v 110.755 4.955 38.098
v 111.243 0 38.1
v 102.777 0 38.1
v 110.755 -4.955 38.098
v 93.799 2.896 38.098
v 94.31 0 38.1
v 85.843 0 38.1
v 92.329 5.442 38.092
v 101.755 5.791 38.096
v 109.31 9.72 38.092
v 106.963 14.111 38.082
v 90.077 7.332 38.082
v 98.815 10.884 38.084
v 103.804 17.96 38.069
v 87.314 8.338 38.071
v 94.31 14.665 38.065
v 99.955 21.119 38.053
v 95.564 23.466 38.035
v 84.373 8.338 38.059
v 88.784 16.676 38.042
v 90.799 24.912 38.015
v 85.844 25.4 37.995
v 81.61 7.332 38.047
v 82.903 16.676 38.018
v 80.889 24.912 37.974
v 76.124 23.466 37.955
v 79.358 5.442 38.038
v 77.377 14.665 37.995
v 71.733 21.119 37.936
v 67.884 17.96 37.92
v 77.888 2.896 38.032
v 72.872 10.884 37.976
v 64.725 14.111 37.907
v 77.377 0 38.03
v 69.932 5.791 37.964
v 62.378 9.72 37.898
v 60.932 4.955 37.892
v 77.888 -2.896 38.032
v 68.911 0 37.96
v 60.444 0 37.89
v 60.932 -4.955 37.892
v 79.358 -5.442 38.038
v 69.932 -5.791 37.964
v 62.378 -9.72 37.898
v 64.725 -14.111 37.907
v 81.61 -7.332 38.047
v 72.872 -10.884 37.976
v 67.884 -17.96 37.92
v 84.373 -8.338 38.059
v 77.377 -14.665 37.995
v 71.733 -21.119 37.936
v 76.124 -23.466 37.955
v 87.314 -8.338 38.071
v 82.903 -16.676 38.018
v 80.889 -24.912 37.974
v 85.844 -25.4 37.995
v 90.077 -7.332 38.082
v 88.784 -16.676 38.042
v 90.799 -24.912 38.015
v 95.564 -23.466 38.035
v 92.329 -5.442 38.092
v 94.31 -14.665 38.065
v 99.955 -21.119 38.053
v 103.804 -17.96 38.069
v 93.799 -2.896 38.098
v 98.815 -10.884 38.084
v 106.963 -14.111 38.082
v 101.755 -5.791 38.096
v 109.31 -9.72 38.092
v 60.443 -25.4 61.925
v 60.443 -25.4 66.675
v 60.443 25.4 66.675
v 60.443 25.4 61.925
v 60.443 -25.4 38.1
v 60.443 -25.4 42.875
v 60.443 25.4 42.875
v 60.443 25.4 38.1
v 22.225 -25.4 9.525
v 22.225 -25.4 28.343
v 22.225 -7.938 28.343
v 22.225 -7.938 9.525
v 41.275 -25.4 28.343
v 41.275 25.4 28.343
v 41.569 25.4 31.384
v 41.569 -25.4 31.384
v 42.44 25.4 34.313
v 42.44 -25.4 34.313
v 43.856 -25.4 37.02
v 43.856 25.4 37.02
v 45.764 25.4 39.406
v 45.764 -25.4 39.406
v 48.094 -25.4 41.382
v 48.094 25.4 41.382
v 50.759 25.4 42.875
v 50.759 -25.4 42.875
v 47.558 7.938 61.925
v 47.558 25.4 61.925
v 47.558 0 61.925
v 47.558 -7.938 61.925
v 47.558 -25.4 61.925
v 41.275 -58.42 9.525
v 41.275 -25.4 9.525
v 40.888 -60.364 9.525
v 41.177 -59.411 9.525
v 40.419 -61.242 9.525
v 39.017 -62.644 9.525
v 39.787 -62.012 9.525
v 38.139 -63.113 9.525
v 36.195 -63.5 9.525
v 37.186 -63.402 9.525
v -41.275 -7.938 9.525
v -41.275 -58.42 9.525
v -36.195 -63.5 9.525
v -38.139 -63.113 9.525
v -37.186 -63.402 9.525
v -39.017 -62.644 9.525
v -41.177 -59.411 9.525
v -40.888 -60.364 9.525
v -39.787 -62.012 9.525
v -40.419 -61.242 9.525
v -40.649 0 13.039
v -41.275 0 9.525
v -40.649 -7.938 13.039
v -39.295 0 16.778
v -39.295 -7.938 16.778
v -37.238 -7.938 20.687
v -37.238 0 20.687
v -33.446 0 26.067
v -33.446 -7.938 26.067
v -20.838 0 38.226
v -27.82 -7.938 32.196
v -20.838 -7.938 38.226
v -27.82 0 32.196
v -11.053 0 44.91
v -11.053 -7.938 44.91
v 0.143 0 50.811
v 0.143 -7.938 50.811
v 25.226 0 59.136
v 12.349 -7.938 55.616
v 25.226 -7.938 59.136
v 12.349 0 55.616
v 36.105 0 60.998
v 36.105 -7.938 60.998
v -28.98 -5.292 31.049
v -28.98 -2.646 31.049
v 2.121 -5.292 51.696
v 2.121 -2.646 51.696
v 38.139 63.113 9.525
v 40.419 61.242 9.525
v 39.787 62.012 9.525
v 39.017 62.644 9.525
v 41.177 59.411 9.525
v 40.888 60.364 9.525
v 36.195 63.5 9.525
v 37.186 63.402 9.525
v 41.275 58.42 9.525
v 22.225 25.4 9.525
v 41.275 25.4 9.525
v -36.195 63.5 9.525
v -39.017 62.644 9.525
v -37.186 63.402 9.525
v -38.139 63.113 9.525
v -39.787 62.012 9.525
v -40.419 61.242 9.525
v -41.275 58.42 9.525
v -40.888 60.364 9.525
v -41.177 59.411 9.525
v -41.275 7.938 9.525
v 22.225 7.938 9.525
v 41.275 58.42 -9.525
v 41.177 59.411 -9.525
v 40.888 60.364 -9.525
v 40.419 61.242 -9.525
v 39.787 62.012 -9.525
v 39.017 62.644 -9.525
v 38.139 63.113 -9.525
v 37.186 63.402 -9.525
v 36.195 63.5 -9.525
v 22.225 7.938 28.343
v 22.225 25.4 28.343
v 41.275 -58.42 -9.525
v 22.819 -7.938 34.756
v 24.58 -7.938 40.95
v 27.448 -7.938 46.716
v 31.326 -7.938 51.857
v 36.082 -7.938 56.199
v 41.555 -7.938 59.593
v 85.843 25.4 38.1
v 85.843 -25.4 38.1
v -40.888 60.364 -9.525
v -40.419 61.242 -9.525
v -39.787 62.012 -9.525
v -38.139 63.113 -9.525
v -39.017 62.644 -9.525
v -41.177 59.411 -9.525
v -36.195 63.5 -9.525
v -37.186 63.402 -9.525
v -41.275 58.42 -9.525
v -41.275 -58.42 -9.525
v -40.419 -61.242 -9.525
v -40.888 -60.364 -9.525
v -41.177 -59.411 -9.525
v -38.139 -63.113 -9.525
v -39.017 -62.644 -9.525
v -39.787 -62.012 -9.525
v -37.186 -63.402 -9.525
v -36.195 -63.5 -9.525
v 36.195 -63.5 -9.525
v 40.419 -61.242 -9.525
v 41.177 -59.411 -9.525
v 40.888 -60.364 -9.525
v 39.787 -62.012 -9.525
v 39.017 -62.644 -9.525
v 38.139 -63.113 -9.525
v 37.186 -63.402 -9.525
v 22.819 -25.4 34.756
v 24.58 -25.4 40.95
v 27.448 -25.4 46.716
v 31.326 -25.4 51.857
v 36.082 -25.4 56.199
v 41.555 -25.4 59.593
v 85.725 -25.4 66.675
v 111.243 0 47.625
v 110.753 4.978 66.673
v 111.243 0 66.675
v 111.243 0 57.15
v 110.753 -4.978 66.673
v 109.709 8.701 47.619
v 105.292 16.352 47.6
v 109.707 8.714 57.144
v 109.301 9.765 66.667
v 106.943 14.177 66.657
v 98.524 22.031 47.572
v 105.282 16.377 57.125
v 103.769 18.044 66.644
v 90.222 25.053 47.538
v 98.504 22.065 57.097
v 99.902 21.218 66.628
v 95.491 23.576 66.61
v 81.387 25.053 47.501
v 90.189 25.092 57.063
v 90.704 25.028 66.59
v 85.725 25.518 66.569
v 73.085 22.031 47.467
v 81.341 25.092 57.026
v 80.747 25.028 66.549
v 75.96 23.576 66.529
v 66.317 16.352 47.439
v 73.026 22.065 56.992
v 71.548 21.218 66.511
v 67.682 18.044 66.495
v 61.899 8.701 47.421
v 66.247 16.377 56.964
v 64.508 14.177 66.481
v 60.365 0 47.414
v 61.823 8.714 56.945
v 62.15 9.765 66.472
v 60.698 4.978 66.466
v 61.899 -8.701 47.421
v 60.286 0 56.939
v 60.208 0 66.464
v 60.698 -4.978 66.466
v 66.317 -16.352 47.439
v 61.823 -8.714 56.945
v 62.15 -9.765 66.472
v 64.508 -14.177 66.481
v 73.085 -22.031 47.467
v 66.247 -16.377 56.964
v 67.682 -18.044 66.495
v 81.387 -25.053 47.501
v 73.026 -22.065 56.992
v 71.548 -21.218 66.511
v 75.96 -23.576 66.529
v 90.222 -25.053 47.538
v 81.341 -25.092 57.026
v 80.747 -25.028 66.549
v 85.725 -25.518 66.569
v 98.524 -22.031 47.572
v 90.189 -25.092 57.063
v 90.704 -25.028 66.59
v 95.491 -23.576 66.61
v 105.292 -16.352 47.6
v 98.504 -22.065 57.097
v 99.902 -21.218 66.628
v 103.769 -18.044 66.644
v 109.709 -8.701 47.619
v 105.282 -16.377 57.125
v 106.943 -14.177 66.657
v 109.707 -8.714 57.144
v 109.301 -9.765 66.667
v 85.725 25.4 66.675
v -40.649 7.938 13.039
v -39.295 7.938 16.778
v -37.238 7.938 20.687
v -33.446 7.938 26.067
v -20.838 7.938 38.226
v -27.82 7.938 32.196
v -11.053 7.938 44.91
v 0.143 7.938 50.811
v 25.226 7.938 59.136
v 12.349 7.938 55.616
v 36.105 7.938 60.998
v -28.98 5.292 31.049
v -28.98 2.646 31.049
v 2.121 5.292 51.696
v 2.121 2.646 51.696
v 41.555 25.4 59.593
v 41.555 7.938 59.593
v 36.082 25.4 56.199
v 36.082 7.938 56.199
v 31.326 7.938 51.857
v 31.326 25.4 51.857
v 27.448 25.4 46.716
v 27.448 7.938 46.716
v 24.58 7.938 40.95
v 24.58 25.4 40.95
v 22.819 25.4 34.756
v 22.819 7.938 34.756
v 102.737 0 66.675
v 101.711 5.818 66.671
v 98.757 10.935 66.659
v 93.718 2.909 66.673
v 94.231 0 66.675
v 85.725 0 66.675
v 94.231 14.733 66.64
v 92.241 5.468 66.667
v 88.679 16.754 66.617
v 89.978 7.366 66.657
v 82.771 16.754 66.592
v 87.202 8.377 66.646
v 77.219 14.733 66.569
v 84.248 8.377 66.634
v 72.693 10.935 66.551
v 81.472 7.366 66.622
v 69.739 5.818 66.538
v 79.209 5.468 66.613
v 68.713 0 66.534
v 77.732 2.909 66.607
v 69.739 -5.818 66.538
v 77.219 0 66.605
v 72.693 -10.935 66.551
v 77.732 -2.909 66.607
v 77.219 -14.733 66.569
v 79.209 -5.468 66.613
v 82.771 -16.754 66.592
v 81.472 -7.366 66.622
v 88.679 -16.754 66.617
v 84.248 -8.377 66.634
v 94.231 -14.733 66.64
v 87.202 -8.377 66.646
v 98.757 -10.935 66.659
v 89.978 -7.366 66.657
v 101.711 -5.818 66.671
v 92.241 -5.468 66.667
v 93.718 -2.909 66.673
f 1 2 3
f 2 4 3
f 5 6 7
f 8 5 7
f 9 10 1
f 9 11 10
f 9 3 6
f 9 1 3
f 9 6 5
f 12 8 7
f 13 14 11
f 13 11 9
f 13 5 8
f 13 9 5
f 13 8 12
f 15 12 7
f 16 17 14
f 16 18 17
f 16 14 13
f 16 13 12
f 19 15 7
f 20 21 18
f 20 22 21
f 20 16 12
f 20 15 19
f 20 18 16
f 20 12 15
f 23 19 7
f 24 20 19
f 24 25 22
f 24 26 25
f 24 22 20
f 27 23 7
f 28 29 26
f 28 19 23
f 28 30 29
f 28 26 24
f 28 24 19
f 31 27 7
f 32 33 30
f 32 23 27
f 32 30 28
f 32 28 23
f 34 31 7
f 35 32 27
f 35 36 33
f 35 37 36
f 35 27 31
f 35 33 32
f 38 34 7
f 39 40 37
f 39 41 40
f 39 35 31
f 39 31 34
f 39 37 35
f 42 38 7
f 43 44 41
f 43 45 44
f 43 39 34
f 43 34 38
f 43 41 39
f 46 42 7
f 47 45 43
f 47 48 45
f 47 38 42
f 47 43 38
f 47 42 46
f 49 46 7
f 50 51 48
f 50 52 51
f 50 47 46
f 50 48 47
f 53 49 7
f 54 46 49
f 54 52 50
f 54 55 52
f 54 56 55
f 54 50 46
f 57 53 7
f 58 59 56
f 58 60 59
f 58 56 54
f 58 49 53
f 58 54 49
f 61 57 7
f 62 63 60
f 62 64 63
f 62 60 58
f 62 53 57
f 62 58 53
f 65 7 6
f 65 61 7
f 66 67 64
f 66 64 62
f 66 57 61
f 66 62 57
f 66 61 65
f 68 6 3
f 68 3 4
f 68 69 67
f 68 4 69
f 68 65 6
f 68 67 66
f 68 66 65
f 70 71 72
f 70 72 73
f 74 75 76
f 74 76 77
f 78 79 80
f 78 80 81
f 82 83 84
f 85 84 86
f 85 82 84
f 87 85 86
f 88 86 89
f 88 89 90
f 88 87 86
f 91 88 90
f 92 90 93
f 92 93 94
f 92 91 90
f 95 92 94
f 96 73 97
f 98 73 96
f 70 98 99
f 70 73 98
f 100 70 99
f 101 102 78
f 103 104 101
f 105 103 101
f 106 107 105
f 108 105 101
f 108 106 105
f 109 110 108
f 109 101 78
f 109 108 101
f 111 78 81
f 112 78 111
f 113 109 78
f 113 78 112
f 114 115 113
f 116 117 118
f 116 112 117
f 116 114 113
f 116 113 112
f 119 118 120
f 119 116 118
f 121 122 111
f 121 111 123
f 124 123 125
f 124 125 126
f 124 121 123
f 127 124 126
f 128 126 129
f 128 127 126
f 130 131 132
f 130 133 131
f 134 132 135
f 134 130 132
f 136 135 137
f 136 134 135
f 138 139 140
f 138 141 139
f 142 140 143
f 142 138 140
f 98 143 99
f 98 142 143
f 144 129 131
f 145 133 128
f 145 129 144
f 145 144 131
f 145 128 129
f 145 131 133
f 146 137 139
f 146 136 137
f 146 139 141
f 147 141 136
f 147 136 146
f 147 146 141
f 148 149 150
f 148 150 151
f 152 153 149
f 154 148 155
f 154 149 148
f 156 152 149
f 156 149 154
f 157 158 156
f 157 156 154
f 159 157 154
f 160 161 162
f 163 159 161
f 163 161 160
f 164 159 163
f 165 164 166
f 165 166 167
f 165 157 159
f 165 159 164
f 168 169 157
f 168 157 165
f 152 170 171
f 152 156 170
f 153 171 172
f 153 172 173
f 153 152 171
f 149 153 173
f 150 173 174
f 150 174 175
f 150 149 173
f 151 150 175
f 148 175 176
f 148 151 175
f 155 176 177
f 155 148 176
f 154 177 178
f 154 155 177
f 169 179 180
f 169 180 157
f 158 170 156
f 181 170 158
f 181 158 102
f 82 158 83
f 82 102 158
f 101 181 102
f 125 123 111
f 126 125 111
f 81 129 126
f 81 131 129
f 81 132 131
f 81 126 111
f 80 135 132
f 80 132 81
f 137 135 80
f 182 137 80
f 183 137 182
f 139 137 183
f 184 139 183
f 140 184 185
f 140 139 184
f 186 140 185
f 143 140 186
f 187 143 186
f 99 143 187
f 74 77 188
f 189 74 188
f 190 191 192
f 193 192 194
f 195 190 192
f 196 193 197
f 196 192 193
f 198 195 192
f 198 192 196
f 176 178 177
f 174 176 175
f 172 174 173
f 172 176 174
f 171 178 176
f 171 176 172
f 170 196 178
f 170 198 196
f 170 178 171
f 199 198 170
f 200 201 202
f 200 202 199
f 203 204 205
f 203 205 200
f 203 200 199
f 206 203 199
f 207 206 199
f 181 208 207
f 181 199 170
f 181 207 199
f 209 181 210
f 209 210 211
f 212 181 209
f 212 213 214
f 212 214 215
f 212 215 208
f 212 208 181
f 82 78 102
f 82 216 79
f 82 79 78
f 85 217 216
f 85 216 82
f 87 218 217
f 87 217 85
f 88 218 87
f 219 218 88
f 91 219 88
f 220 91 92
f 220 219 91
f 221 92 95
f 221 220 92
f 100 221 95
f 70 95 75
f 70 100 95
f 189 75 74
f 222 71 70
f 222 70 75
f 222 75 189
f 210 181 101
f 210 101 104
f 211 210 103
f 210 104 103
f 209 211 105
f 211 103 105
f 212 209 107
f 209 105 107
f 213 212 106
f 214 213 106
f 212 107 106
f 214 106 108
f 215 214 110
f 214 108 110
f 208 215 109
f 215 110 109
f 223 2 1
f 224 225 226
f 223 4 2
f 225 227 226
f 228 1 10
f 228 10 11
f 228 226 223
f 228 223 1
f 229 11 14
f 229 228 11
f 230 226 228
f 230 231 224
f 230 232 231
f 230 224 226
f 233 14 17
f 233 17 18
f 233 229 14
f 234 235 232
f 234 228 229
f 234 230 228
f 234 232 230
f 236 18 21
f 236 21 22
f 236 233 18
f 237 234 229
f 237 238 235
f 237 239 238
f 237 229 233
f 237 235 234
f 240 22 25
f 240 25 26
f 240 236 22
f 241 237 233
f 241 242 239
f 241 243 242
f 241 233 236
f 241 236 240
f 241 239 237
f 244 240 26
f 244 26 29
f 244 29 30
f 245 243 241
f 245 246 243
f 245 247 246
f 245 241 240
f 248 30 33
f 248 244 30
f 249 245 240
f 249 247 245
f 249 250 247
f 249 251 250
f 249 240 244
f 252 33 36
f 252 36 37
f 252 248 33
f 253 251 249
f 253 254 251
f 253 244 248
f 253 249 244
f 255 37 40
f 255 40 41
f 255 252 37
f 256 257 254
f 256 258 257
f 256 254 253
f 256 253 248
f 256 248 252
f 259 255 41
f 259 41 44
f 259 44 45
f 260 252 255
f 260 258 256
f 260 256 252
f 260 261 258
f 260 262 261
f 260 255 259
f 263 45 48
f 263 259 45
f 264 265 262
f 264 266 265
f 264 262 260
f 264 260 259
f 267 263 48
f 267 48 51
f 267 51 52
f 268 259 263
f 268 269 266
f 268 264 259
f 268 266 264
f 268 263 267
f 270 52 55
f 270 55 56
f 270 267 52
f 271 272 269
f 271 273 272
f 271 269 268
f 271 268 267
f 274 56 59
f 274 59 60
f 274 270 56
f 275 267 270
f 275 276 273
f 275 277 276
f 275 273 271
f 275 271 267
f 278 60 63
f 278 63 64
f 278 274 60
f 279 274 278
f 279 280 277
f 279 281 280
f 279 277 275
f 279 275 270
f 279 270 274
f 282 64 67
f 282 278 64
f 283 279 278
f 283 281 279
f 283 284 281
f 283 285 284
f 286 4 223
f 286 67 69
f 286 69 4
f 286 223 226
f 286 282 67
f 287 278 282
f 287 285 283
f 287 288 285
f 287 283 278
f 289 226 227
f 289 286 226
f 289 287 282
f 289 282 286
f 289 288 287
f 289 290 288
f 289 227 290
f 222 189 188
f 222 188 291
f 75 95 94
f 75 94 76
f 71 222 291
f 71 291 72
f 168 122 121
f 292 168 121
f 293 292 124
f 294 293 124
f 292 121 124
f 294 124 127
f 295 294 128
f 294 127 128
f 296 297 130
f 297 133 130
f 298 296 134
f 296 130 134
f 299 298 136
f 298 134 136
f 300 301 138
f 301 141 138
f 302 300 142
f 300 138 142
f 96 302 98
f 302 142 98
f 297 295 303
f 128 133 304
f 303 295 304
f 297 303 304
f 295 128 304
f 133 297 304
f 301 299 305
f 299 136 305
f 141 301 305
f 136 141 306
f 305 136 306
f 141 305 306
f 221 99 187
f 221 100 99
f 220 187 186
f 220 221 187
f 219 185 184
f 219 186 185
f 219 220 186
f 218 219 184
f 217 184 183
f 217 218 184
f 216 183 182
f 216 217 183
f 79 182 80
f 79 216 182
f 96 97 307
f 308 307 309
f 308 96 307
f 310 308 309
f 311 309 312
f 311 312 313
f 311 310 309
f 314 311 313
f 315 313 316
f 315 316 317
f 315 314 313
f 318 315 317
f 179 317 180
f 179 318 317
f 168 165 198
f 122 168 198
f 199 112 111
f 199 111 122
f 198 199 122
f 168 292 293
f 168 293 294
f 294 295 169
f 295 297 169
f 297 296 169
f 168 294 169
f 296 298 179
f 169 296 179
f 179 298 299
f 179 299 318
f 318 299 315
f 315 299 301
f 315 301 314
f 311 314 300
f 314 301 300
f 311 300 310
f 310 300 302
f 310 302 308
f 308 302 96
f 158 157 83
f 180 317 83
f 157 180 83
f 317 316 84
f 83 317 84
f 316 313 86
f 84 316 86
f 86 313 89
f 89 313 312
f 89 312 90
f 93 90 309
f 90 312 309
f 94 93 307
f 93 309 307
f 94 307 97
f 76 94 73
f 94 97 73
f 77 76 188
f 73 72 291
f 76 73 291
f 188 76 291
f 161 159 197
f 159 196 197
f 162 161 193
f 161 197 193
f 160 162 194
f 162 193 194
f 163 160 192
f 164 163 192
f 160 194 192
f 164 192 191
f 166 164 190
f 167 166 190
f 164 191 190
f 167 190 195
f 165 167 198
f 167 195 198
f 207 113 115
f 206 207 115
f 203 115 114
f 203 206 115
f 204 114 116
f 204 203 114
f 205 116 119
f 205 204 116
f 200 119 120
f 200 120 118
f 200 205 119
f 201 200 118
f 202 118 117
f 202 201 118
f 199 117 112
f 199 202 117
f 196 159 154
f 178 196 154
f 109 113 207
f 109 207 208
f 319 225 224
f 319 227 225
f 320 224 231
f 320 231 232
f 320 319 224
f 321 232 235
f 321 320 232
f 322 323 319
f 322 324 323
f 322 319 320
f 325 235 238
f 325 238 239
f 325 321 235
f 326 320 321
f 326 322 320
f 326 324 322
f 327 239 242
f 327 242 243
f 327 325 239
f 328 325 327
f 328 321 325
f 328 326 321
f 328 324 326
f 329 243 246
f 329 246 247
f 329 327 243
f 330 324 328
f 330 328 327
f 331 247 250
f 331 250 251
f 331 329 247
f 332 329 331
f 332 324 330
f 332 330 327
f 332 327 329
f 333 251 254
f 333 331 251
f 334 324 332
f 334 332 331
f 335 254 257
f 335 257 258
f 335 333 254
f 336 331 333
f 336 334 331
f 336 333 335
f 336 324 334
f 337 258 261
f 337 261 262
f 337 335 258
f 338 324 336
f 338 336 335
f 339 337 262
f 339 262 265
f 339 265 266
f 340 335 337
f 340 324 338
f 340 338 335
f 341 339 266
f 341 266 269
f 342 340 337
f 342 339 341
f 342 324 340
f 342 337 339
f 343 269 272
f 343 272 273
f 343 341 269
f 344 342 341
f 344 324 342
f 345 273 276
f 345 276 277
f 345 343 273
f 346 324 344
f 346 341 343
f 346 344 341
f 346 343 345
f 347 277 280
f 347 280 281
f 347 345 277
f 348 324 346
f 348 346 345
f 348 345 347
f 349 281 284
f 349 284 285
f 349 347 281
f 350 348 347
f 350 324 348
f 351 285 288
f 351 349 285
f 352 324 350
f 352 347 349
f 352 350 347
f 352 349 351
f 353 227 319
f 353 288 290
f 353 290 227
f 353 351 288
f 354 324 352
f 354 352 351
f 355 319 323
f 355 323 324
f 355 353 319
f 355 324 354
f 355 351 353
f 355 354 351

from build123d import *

# Parameters (mm, degrees)
F1_DEPTH = 63.5
F2_DEPTH = 25.4
F3_DEPTH = 7.9375
F5_R     = 5.08


with BuildPart() as f1:
    # F0 (on Front) → F1 (new body, symmetric)
    with BuildSketch(Plane.XZ):
        Polygon((41.275, -9.525), (41.275, 9.525), (22.225, 9.525), (-41.275, 9.525), (-41.275, -9.525), align=None)
    extrude(amount=F1_DEPTH, both=True)

    # F0 (on Front) → F2 (join, symmetric)
    with BuildSketch(Plane.XZ):
        with BuildLine():
            Line((22.225, 9.525), (41.275, 9.525))
            Line((41.275, 9.525), (41.275, 28.3433184846))
            ThreePointArc((41.275, 28.3433184846), (43.855889591, 37.0198531289), (50.7593783852, 42.8752))
            Line((50.7593783852, 42.8752), (60.4433172107, 42.8752))
            Line((60.4433172107, 42.8752), (60.4433172107, 61.9252))
            Line((60.4433172107, 61.9252), (47.5576666609, 61.9252))
            ThreePointArc((47.5576666609, 61.9252), (29.2683943534, 49.3759524511), (22.225, 28.3433184846))
            Line((22.225, 28.3433184846), (22.225, 9.525))
        make_face()
        Polygon((60.4433172107, 61.9252), (60.4433172107, 42.8752), (60.4433172107, 38.1), (85.8433172107, 38.1), (85.725, 66.675), (60.4433172107, 66.675), align=None)
    extrude(amount=F2_DEPTH, both=True)

    # F0 (on Front) → F3 (join, symmetric)
    with BuildSketch(Plane.XZ):
        with BuildLine():
            Line((-41.275, 9.525), (22.225, 9.525))
            Line((22.225, 9.525), (22.225, 28.3433184846))
            ThreePointArc((22.225, 28.3433184846), (29.2683943534, 49.3759524511), (47.5576666609, 61.9252))
            add(Edge.make_bspline(
                [(-41.275, 9.525), (-39.8741327226, 28.3073559403), (-3.5557583906, 60.0859336555), (47.5576666609, 61.9252)],
                knots=[0, 0, 0, 0, 103.1359473032, 103.1359473032, 103.1359473032, 103.1359473032], degree=3))
        make_face()
    extrude(amount=F3_DEPTH, both=True)

    # F5
    f5_edges = [f1.edges().sort_by_distance(p)[0] for p in [
        (-41.275, -63.5, 0),
        (41.275, -63.5, 0),
        (41.275, 63.5, 0),
        (-41.275, 63.5, 0),
    ]]
    fillet(f5_edges, radius=F5_R)


with BuildPart() as f4:
    # F0 (on Front) → F4 (revolve)
    with BuildSketch(Plane.XZ):
        Polygon((85.725, 66.675), (85.8433172107, 38.1), (111.2433172107, 38.1), (111.2433172107, 66.675), align=None)
    revolve(axis=Axis((85.7841586053, 0, 52.3875), (-0.0041405493, 0, 0.9999914279)))


solid = Compound([f1.part, f4.part])
